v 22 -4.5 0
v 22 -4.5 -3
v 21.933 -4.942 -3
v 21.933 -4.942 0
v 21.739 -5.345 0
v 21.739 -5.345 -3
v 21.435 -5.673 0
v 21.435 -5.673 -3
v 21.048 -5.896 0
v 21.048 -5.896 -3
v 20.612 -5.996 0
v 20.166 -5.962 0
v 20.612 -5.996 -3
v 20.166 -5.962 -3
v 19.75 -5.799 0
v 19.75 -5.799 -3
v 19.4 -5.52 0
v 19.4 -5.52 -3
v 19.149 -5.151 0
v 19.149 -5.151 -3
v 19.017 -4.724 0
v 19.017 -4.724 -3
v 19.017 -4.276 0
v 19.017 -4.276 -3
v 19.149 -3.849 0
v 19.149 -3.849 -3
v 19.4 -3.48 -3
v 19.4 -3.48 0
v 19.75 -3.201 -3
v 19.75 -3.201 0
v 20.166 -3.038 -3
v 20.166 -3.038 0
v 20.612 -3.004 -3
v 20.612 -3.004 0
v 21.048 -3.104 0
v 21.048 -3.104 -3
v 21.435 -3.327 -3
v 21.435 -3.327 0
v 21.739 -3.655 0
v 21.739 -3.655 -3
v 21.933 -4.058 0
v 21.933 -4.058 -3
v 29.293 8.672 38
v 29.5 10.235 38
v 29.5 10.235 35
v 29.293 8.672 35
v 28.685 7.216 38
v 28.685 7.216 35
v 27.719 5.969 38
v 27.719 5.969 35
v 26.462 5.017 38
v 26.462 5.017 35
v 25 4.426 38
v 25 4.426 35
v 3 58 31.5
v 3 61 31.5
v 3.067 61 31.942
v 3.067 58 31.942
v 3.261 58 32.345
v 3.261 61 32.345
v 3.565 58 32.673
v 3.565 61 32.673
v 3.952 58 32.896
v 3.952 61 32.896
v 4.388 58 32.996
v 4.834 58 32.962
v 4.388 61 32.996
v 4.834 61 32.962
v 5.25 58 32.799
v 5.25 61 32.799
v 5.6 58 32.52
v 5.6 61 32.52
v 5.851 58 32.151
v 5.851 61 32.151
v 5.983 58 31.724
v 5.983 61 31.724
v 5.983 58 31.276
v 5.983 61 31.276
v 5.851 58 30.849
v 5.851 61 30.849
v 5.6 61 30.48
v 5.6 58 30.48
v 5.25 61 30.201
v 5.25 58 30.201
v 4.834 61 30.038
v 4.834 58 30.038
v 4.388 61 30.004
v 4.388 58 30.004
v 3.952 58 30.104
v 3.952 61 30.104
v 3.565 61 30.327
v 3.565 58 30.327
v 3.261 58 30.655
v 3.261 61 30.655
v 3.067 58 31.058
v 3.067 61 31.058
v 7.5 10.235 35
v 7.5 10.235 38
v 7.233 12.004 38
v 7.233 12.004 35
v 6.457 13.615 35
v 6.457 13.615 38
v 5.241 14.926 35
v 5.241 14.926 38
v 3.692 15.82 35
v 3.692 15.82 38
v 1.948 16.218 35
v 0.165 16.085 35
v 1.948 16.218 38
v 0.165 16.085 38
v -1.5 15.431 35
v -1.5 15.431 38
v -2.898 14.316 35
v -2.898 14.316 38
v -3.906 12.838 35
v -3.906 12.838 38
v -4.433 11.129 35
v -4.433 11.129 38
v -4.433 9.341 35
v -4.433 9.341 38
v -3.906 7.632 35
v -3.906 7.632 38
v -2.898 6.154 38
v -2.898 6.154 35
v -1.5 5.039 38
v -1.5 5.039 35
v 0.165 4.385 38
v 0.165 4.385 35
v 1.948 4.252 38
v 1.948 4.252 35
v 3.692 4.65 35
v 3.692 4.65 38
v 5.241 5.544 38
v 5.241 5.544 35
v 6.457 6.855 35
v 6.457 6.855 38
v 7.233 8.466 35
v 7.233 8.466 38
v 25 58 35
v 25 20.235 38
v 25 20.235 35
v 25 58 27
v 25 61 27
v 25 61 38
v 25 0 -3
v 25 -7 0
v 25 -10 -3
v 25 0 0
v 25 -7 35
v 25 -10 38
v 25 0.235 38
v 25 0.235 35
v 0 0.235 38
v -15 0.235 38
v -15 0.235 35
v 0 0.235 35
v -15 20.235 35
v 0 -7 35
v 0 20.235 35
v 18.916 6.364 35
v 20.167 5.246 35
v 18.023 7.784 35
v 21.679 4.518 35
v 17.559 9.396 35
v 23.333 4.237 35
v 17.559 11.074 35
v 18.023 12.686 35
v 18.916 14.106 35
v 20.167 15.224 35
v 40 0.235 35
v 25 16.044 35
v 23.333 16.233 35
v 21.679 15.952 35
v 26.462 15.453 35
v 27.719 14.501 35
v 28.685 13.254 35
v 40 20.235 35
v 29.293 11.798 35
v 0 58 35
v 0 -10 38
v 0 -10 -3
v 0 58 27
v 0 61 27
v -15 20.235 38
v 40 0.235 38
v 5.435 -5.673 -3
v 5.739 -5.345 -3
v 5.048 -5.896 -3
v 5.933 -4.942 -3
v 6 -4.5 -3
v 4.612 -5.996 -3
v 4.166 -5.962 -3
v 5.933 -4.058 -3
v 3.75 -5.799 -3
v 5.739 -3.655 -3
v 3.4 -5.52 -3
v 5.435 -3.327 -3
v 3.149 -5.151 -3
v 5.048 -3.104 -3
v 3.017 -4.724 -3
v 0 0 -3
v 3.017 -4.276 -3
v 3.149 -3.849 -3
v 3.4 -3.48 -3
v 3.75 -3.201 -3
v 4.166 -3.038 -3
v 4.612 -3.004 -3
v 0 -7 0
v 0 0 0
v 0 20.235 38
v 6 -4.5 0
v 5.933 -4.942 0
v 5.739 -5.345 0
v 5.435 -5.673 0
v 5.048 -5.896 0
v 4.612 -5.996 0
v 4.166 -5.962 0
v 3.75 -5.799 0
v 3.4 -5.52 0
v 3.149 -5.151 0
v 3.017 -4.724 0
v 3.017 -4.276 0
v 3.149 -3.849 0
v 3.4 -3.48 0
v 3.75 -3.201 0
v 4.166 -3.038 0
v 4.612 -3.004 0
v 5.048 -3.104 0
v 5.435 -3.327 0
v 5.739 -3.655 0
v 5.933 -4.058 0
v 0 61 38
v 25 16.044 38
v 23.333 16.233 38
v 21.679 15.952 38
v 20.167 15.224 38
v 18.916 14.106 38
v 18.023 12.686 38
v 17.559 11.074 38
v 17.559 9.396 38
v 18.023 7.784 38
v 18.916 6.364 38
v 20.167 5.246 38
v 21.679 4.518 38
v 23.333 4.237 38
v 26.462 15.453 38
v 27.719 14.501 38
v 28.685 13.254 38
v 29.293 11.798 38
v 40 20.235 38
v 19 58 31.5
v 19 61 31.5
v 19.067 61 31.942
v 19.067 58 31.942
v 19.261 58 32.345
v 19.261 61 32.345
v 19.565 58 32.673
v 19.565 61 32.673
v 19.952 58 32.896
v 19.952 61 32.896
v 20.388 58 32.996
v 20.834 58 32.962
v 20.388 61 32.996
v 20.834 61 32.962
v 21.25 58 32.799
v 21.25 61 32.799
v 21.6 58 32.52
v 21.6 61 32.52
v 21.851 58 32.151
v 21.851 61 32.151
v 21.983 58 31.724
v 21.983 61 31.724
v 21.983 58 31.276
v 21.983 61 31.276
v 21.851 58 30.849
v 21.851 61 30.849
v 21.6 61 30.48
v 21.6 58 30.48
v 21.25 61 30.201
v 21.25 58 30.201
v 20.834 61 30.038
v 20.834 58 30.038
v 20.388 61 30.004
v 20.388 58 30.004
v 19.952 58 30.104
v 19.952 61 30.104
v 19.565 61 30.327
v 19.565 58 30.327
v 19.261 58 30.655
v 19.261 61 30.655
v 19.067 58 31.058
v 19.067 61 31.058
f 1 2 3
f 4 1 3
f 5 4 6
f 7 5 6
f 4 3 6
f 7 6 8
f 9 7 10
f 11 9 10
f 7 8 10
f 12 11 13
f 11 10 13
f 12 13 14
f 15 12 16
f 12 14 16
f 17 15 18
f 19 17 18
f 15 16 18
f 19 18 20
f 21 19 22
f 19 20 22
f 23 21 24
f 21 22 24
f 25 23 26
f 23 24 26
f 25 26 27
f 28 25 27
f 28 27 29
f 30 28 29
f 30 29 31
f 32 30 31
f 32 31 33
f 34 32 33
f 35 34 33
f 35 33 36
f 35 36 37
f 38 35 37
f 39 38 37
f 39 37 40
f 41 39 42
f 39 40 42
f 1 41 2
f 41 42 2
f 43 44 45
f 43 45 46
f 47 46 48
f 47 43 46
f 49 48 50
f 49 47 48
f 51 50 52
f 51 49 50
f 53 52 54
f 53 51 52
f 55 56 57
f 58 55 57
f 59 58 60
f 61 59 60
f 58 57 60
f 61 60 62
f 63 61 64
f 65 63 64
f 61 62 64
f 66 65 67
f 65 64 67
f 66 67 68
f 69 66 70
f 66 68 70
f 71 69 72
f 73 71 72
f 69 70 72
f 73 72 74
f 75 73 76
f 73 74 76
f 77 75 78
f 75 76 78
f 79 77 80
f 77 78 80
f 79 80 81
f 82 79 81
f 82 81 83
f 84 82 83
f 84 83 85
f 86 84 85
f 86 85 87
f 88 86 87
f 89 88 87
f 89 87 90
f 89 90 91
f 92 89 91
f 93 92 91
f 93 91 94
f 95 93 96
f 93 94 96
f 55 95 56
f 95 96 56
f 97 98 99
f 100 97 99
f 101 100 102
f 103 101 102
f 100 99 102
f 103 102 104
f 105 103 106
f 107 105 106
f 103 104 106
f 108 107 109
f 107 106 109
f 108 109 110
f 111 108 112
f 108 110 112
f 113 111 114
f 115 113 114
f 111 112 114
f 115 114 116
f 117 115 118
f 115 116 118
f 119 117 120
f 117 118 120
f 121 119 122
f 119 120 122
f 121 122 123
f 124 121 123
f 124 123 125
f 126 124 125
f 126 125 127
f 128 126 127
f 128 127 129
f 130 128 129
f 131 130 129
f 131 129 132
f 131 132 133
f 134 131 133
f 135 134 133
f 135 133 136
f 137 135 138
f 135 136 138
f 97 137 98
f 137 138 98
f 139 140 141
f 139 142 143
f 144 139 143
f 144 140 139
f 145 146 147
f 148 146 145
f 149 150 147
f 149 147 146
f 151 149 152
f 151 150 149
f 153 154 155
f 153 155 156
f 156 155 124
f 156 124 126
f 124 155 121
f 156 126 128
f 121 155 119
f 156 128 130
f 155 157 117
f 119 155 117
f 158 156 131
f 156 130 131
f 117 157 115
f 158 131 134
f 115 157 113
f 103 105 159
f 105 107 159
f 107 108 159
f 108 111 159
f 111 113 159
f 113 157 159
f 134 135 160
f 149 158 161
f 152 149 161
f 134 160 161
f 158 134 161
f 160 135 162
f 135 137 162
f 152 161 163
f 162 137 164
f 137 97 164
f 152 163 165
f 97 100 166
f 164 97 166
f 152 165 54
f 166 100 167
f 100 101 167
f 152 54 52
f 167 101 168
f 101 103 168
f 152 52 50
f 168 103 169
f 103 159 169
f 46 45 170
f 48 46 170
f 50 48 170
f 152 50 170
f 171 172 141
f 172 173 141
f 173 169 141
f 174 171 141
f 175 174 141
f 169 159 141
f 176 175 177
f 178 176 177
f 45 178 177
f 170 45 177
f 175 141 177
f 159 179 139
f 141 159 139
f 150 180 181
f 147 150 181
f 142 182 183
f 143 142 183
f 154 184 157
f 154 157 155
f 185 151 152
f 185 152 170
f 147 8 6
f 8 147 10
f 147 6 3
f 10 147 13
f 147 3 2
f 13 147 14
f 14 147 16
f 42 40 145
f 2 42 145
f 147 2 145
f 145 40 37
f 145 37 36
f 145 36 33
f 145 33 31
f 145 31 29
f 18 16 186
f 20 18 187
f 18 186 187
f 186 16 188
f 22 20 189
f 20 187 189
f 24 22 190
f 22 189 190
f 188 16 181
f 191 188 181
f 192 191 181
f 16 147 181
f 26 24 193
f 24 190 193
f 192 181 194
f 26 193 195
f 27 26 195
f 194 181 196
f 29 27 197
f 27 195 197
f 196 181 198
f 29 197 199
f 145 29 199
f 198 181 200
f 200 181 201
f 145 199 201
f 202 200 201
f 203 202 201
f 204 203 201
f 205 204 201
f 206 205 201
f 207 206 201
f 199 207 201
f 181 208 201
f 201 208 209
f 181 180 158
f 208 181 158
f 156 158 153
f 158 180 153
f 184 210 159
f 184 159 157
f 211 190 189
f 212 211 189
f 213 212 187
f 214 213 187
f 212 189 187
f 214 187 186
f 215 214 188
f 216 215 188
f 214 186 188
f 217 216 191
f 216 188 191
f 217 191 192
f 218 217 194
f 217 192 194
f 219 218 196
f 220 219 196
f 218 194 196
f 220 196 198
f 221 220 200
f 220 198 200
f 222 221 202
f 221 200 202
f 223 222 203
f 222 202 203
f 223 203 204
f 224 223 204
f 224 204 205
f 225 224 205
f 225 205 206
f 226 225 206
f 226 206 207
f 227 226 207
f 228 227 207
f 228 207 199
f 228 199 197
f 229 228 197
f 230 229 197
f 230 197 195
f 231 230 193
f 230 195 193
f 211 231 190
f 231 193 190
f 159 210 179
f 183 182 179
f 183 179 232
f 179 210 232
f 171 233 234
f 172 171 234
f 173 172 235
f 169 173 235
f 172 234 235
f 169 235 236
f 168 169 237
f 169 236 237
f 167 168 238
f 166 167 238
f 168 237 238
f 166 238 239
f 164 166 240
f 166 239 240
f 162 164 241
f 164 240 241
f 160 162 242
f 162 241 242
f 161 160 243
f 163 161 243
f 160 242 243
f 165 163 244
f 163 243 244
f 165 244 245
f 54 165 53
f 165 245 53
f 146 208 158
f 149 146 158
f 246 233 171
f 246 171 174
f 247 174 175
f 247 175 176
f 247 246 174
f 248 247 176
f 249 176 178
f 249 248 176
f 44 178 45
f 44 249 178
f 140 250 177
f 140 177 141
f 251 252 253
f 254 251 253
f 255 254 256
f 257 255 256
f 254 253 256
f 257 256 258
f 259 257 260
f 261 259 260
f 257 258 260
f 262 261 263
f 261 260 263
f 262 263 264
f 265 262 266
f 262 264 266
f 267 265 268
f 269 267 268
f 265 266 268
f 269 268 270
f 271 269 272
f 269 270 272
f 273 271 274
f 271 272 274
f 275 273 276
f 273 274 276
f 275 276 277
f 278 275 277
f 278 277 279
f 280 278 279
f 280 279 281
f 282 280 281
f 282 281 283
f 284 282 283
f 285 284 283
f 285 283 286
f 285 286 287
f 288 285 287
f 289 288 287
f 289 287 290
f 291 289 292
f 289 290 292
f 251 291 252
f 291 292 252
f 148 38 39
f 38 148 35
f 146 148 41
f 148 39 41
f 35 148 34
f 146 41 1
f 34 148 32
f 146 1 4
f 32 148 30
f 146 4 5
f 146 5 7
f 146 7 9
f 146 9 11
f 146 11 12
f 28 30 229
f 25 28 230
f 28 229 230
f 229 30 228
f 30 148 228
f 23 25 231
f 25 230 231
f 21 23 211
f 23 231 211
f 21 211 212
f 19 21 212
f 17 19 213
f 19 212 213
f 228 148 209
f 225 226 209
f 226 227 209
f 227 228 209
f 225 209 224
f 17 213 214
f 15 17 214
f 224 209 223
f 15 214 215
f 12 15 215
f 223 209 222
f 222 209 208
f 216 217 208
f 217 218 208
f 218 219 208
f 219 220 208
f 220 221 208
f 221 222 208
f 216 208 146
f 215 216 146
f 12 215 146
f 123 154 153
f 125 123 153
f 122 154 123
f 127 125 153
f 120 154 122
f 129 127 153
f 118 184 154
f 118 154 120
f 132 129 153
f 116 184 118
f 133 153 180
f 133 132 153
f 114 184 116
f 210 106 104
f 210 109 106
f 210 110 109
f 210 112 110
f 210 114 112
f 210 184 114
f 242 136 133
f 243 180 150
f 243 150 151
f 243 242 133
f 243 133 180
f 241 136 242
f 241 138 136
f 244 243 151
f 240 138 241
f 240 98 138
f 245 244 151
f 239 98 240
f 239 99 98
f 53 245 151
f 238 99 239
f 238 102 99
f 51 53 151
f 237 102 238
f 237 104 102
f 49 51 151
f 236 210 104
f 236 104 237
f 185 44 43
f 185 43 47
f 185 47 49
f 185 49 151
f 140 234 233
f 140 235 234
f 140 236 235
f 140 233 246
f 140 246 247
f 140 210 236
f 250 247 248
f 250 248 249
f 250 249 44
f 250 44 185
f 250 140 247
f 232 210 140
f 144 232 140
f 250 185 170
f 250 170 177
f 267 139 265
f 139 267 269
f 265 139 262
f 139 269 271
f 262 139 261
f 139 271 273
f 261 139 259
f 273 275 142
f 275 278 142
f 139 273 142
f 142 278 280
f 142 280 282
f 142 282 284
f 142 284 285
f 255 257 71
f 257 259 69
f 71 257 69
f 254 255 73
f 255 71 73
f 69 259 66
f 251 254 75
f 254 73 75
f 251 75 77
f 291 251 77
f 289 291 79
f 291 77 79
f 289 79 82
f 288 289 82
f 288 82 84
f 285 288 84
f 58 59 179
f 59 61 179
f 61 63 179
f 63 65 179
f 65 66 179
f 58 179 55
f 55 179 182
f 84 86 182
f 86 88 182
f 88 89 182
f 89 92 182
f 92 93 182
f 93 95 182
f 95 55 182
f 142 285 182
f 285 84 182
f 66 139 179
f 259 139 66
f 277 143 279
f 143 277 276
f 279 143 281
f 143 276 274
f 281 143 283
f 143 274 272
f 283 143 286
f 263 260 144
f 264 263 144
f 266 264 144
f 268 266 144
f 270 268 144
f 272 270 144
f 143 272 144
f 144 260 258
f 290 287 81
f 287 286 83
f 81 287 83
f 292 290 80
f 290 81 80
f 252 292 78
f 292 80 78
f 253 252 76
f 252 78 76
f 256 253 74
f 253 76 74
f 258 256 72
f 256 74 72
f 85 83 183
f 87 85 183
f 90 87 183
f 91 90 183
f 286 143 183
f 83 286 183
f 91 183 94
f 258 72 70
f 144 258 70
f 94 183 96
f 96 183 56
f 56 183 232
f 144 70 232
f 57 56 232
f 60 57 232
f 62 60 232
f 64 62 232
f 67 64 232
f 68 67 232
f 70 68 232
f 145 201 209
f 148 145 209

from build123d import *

# Parameters (mm, degrees)
F1_DEPTH = 25
F2_R     = 1.5
F3_DEPTH = 3
F4_R     = 1.5
F5_DEPTH = 3
F7_DEPTH = 3
F8_R     = 6
F9_DEPTH = 3


with BuildPart() as f1:
    # F0 (on Right) → F1 (new body)
    with BuildSketch(Plane.YZ):
        Polygon((0, -3), (0, 0), (-7, 0), (-7, 35), (58, 35), (58, 27), (61, 27), (61, 38), (-10, 38), (-10, -3), align=None)
    extrude(amount=F1_DEPTH)

    # F2 (on face) → F3 (cut)
    with BuildSketch(Plane(origin=(0, 0, -3), x_dir=(1, 0, 0), z_dir=(0, 0, -1))):
        with Locations((20.5, 4.5)):
            Circle(F2_R)
        with Locations((4.5, 4.5)):
            Circle(F2_R)
    extrude(amount=-F3_DEPTH, mode=Mode.SUBTRACT)

    # F4 (on face) → F5 (cut)
    with BuildSketch(Plane(origin=(0, 61, 0), x_dir=(-1, 0, 0), z_dir=(0, 1, 0))):
        with Locations((-20.5, 31.5)):
            Circle(F4_R)
        with Locations((-4.5, 31.5)):
            Circle(F4_R)
    extrude(amount=-F5_DEPTH, mode=Mode.SUBTRACT)

    # F6 (on face) → F7 (join)
    with BuildSketch(Plane.XY.offset(38)):
        with BuildLine():
            Line((0, 16.0444763524), (0, 20.2350013331))
            Line((0, 20.2350013331), (-15, 20.2350013331))
            Line((-15, 20.2350013331), (-15, 0.2350013331))
            Line((-15, 0.2350013331), (0, 0.2350013331))
            Line((0, 0.2350013331), (0, 4.4255263137))
            ThreePointArc((0, 4.4255263137), (-4.5, 10.2350013331), (0, 16.0444763524))
        make_face()
        with BuildLine():
            Line((0, 13.9431005766), (0, 16.0444763524))
            ThreePointArc((0, 16.0444763524), (-4.5, 10.2350013331), (0, 4.4255263137))
            Line((0, 4.4255263137), (0, 6.5269020895))
            ThreePointArc((0, 6.5269020895), (-2.5, 10.2350013331), (0, 13.9431005766))
        make_face()
        with BuildLine():
            Line((40, 20.2350013331), (25, 20.2350013331))
            Line((25, 20.2350013331), (25, 16.0444763524))
            ThreePointArc((25, 16.0444763524), (28.2434164903, 13.9092359472), (29.5, 10.2350013331))
            ThreePointArc((29.5, 10.2350013331), (28.2434164903, 6.5607667189), (25, 4.4255263137))
            Line((25, 4.4255263137), (25, 0.2350013331))
            Line((25, 0.2350013331), (40, 0.2350013331))
            Line((40, 0.2350013331), (40, 20.2350013331))
        make_face()
        with BuildLine():
            Line((25, 13.9431005766), (25, 16.0444763524))
            ThreePointArc((25, 16.0444763524), (17.5, 10.2350013331), (25, 4.4255263137))
            Line((25, 4.4255263137), (25, 6.5269020895))
            ThreePointArc((25, 6.5269020895), (19.5, 10.2350013331), (25, 13.9431005766))
        make_face()
        with BuildLine():
            Line((25, 6.5269020895), (25, 13.9431005766))
            ThreePointArc((25, 13.9431005766), (19.5, 10.2350013331), (25, 6.5269020895))
        make_face()
    extrude(amount=-F7_DEPTH)

    # F8 (on face) → F9 (cut)
    with BuildSketch(Plane.XY.offset(38)):
        with Locations((1.5, 10.2350013331)):
            Circle(F8_R)
        with BuildLine():
            ThreePointArc((0, 6.5269020895), (-2.5, 10.2350013331), (0, 13.9431005766))
            Line((0, 13.9431005766), (0, 6.5269020895))
        make_face(mode=Mode.SUBTRACT)
        with BuildLine():
            Line((25, 4.4255263137), (25, 16.0444763524))
            ThreePointArc((25, 16.0444763524), (17.5, 10.2350013331), (25, 4.4255263137))
        make_face()
        with BuildLine():
            ThreePointArc((25, 4.4255263137), (28.2434164903, 6.5607667189), (29.5, 10.2350013331))
            ThreePointArc((29.5, 10.2350013331), (28.2434164903, 13.9092359472), (25, 16.0444763524))
            Line((25, 16.0444763524), (25, 4.4255263137))
        make_face()
    extrude(amount=-F9_DEPTH, mode=Mode.SUBTRACT)


solid = f1.part
